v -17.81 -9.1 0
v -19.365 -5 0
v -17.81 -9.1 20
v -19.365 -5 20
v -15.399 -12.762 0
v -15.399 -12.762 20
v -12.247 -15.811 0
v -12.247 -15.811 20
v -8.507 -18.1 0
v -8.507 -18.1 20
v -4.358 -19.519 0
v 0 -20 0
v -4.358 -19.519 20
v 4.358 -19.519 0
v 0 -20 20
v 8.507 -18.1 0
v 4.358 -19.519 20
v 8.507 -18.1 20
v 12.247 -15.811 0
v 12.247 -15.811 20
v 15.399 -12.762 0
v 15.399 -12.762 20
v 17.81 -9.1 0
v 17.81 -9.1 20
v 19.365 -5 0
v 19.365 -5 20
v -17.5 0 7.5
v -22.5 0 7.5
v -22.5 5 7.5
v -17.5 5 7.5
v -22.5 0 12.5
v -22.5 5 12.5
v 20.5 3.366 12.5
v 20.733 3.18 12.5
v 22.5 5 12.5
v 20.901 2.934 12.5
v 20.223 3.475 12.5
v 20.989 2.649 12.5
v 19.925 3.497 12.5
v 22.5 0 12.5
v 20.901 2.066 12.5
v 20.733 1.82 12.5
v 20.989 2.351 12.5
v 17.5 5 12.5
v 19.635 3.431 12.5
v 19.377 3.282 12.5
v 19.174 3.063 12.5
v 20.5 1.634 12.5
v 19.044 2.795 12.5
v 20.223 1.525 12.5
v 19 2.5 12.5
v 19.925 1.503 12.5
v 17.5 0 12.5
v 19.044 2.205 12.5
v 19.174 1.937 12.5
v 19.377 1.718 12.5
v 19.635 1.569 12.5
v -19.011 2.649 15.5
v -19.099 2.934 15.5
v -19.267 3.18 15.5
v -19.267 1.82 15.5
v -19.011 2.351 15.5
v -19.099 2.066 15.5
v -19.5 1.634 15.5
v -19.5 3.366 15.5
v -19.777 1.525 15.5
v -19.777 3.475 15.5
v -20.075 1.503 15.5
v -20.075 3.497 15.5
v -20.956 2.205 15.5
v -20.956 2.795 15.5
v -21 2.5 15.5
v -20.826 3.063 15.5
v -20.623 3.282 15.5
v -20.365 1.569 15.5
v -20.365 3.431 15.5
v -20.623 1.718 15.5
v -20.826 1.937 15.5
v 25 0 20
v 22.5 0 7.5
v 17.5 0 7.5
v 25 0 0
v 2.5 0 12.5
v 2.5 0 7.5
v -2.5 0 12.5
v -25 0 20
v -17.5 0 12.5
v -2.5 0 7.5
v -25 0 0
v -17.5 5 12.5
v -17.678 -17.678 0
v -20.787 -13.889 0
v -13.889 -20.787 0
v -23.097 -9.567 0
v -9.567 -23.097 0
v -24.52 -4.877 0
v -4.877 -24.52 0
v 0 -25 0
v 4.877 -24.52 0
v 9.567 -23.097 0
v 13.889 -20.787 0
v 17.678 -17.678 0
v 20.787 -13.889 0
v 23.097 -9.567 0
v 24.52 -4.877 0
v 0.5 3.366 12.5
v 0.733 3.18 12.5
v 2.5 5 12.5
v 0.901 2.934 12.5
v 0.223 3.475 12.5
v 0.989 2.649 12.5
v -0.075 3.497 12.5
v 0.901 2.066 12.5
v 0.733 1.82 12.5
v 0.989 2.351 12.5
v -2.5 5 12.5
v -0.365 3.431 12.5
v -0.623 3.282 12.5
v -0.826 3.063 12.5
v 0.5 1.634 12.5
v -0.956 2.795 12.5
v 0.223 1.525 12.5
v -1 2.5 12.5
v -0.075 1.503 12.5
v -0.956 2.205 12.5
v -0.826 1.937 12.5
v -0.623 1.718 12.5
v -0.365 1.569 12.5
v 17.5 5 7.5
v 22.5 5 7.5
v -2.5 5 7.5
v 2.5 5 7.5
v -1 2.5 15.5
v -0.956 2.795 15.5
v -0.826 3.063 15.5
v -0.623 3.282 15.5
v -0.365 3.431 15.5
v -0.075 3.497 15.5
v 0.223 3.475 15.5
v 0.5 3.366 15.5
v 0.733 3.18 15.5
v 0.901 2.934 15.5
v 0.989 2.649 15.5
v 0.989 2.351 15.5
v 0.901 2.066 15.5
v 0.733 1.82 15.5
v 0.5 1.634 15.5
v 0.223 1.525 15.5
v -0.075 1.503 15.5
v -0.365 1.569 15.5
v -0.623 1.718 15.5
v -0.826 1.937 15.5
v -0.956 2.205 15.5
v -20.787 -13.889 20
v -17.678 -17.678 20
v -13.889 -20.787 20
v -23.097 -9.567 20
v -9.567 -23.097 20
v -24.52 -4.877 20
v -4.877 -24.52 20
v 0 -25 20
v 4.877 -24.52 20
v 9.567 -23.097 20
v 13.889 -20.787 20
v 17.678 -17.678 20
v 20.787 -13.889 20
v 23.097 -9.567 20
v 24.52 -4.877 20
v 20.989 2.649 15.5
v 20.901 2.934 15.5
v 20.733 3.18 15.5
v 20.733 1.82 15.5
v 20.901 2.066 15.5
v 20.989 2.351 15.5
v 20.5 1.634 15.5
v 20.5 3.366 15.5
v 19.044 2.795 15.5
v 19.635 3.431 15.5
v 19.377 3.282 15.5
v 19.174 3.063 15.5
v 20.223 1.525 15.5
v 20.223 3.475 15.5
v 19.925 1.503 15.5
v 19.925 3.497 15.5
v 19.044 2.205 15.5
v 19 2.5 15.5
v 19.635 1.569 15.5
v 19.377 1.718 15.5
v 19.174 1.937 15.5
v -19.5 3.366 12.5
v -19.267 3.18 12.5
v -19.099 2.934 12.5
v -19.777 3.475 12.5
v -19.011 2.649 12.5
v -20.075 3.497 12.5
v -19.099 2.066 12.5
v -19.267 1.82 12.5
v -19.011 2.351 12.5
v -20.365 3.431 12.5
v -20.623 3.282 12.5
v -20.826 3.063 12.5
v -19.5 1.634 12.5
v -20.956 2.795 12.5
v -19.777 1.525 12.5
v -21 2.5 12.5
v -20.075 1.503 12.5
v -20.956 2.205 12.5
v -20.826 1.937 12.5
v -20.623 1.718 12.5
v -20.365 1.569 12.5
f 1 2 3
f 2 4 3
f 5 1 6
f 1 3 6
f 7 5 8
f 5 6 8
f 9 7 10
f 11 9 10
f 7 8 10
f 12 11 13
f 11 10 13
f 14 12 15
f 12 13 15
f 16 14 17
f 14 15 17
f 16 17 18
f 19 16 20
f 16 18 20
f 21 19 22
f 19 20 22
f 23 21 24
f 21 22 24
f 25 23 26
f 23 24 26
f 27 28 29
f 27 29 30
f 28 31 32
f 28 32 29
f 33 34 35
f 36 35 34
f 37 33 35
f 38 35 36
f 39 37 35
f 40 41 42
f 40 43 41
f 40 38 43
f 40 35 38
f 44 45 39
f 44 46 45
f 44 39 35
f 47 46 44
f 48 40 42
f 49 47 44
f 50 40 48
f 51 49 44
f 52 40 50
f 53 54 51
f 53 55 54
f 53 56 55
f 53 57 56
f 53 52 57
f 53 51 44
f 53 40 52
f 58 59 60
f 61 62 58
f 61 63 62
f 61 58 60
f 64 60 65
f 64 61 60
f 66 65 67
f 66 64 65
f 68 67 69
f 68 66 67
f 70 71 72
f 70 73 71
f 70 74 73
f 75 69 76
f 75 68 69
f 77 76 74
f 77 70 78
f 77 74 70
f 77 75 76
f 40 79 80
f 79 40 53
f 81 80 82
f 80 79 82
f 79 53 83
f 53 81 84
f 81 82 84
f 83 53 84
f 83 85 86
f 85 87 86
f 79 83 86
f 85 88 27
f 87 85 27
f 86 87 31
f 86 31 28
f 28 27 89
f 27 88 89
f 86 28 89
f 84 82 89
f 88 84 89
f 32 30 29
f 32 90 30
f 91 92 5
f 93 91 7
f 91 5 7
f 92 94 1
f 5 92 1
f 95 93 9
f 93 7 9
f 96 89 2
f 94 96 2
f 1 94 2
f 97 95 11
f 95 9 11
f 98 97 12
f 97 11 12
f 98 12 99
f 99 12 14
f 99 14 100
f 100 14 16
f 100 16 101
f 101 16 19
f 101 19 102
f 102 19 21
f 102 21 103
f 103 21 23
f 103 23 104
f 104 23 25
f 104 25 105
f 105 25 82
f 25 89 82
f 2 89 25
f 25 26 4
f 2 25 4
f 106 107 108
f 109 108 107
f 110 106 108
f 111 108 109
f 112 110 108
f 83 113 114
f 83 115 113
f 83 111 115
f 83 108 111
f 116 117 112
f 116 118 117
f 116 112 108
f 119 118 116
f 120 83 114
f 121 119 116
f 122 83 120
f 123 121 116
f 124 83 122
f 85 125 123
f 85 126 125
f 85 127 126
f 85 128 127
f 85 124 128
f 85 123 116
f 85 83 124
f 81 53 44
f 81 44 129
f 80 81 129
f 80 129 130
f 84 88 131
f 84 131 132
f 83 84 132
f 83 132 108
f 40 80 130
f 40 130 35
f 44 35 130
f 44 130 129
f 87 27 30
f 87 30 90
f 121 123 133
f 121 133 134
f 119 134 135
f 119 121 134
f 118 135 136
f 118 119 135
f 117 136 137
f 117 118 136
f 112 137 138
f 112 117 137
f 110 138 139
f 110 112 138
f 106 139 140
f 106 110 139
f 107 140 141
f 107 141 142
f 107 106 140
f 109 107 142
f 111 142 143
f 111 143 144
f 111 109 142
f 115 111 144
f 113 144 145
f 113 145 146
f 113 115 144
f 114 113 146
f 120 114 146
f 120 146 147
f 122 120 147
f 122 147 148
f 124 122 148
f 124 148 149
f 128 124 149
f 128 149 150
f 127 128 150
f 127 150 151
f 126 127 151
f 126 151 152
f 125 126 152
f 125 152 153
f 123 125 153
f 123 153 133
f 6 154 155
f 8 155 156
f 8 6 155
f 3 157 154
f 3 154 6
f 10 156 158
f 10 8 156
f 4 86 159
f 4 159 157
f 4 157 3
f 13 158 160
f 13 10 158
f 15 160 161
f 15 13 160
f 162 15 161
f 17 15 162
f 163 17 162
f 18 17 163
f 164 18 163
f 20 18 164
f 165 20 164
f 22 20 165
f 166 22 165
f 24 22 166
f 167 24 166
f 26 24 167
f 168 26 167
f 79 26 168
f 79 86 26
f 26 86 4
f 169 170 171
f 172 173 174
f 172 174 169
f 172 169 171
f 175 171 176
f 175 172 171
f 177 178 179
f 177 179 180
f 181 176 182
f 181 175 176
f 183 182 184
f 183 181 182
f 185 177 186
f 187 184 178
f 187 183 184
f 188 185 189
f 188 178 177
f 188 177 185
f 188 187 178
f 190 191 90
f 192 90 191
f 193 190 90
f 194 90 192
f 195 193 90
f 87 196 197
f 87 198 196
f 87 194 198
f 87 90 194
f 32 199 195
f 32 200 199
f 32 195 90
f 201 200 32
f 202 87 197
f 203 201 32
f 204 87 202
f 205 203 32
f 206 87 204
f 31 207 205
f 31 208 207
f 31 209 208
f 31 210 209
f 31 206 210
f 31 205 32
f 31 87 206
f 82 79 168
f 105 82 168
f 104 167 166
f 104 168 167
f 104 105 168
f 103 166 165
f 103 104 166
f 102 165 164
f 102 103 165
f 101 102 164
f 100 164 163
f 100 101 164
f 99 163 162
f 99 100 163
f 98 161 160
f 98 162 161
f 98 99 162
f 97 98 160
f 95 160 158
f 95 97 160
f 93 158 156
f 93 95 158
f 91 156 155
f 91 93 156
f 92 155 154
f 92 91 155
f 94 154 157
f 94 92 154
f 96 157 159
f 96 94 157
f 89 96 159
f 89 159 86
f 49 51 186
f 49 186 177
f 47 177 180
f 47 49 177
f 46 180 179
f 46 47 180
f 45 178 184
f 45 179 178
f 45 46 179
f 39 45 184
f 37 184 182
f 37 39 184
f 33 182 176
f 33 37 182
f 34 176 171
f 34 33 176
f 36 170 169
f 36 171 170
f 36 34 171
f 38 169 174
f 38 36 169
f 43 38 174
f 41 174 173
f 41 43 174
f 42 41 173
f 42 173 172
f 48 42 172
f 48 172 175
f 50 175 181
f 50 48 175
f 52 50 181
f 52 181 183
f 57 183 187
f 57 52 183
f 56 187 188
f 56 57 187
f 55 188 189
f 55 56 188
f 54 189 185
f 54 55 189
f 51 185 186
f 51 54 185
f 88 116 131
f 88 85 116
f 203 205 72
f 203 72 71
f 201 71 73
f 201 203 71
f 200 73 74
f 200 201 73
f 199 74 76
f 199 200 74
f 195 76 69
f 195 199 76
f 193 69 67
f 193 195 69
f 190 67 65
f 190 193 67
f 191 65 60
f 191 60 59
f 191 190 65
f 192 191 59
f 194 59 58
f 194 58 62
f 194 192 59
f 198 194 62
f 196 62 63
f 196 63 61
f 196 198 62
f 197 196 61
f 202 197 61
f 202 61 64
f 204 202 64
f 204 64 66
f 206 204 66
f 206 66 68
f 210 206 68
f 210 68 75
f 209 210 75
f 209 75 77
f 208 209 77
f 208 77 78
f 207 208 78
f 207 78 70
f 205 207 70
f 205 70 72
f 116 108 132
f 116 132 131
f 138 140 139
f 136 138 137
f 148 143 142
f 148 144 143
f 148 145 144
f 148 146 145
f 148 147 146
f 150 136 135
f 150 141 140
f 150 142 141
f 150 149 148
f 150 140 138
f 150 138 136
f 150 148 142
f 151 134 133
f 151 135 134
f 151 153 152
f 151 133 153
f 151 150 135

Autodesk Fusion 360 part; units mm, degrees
sketch "Sketch1" plane through (0, 0, 0) normal (0, 0, 1) x (1, 0, 0)
  circle A0 centre (0, 0) radius 25
  line L0 (0, 0) -> (-25, 0)
  line L1 (0, 0) -> (25, 0)
  dimension "d1" = 50
extrude "Extrude1" add sketch "Sketch1" along normal blind 20 contours A0 L0 L1 picked at (16.5736, -1.242)
sketch "Sketch2" plane through (0, 0, 0) normal (0, 1, 0) x (-1, 0, 0)
  line L0 (-25, 0) -> (25, 0)
  line L1 (25, 0) -> (25, 20)
  line L2 (25, 20) -> (-25, 20)
  line L3 (-25, 20) -> (-25, 0)
  line L4 (0, 0) -> (0, 20)
  line L5 (-25, 10) -> (25, 10)
  line L6 (0, 10) -> (-10, 10)
  line L7 (-10, 10) -> (-20, 10)
  line L8 (0, 10) -> (10, 10)
  line L9 (10, 10) -> (20, 10)
  line L10 (-17.5, 7.5) -> (-22.5, 7.5)
  line L11 (-22.5, 7.5) -> (-22.5, 12.5)
  line L12 (-22.5, 12.5) -> (-17.5, 12.5)
  line L13 (-17.5, 12.5) -> (-17.5, 7.5)
  line L14 (-17.5, 7.5) -> (-22.5, 12.5) construction
  line L15 (-22.5, 7.5) -> (-17.5, 12.5) construction
  line L16 (17.5, 12.5) -> (22.5, 12.5)
  line L17 (22.5, 12.5) -> (22.5, 7.5)
  line L18 (22.5, 7.5) -> (17.5, 7.5)
  line L19 (17.5, 7.5) -> (17.5, 12.5)
  line L20 (17.5, 12.5) -> (22.5, 7.5) construction
  line L21 (22.5, 12.5) -> (17.5, 7.5) construction
  line L22 (2.5, 7.5) -> (-2.5, 7.5)
  line L23 (-2.5, 7.5) -> (-2.5, 12.5)
  line L24 (-2.5, 12.5) -> (2.5, 12.5)
  line L25 (2.5, 12.5) -> (2.5, 7.5)
  line L26 (2.5, 7.5) -> (-2.5, 12.5) construction
  line L27 (-2.5, 7.5) -> (2.5, 12.5) construction
  point P0 (-20, 10)
  point P1 (20, 10)
  point P2 (0, 10)
  dimension "d4" = 10
  dimension "d5" = 10
  dimension "d6" = 10
  dimension "d7" = 10
  dimension "d8" = 5
  dimension "d9" = 5
  dimension "d10" = 5
  dimension "d11" = 5
  dimension "d12" = 5
  dimension "d13" = 5
extrude "Extrude2" add sketch "Sketch2" along normal blind 5 contours L4 L5 L6 L22 L23 | L4 L5 L8 L22 L25 | L5 L7 L11 L12 L13 | L5 L7 L10 L11 L13 | L4 L5 L6 L23 L24 | L4 L5 L8 L24 L25 | L5 L9 L17 L18 L19 | L5 L9 L16 L17 L19
sketch "Sketch3" plane through (0, 0, 20) normal (0, 0, 1) x (-1, 0, 0)
  arc A0 (25, 0) -> (-25, 0) centre (0, 0) ccw
  line L0 (-25, 0) -> (25, 0)
  circle A1 centre (0, 0) radius 20
  line L1 (0, 0) -> (0, 5)
  line L2 (0, 5) -> (19.3649, 5)
  line L3 (0, 5) -> (-19.3649, 5)
  dimension "d16" = 40
  dimension "d17" = 5
extrude "Extrude3" cut sketch "Sketch3" against normal blind 20 contours A1 L2 L3
sketch "Sketch4" plane through (0, 0, 12.5) normal (0, 0, 1) x (-1, 0, 0)
  line L0 (-17.5, 0) -> (-22.5, 0)
  line L1 (-22.5, 0) -> (-22.5, -5)
  line L2 (-22.5, -5) -> (-17.5, -5)
  line L3 (-17.5, -5) -> (-17.5, 0)
  circle A0 centre (-20, -2.5) radius 1
  dimension "d20" = 2
extrude "Extrude4" add sketch "Sketch4" along normal blind 3 contours A0
sketch "Sketch5" plane through (0, 0, 12.5) normal (0, 0, 1) x (-1, 0, 0)
  line L0 (2.5, 0) -> (-2.5, 0)
  line L1 (-2.5, 0) -> (-2.5, -5)
  line L2 (-2.5, -5) -> (2.5, -5)
  line L3 (2.5, -5) -> (2.5, 0)
  line L4 (0, -5) -> (0, 0)
  circle A0 centre (0, -2.5) radius 1
  dimension "d23" = 2
extrude "Extrude5" add sketch "Sketch5" along normal blind 3 contours L4 A0 | L4 A0
sketch "Sketch6" plane through (0, 0, 12.5) normal (0, 0, 1) x (-1, 0, 0)
  line L0 (22.5, 0) -> (17.5, 0)
  line L1 (17.5, 0) -> (17.5, -5)
  line L2 (17.5, -5) -> (22.5, -5)
  line L3 (22.5, -5) -> (22.5, 0)
  line L4 (20, -5) -> (20, 0)
  circle A0 centre (20, -2.5) radius 1
  dimension "d26" = 2
extrude "Extrude6" add sketch "Sketch6" along normal blind 3 contours L4 A0 | L4 A0
